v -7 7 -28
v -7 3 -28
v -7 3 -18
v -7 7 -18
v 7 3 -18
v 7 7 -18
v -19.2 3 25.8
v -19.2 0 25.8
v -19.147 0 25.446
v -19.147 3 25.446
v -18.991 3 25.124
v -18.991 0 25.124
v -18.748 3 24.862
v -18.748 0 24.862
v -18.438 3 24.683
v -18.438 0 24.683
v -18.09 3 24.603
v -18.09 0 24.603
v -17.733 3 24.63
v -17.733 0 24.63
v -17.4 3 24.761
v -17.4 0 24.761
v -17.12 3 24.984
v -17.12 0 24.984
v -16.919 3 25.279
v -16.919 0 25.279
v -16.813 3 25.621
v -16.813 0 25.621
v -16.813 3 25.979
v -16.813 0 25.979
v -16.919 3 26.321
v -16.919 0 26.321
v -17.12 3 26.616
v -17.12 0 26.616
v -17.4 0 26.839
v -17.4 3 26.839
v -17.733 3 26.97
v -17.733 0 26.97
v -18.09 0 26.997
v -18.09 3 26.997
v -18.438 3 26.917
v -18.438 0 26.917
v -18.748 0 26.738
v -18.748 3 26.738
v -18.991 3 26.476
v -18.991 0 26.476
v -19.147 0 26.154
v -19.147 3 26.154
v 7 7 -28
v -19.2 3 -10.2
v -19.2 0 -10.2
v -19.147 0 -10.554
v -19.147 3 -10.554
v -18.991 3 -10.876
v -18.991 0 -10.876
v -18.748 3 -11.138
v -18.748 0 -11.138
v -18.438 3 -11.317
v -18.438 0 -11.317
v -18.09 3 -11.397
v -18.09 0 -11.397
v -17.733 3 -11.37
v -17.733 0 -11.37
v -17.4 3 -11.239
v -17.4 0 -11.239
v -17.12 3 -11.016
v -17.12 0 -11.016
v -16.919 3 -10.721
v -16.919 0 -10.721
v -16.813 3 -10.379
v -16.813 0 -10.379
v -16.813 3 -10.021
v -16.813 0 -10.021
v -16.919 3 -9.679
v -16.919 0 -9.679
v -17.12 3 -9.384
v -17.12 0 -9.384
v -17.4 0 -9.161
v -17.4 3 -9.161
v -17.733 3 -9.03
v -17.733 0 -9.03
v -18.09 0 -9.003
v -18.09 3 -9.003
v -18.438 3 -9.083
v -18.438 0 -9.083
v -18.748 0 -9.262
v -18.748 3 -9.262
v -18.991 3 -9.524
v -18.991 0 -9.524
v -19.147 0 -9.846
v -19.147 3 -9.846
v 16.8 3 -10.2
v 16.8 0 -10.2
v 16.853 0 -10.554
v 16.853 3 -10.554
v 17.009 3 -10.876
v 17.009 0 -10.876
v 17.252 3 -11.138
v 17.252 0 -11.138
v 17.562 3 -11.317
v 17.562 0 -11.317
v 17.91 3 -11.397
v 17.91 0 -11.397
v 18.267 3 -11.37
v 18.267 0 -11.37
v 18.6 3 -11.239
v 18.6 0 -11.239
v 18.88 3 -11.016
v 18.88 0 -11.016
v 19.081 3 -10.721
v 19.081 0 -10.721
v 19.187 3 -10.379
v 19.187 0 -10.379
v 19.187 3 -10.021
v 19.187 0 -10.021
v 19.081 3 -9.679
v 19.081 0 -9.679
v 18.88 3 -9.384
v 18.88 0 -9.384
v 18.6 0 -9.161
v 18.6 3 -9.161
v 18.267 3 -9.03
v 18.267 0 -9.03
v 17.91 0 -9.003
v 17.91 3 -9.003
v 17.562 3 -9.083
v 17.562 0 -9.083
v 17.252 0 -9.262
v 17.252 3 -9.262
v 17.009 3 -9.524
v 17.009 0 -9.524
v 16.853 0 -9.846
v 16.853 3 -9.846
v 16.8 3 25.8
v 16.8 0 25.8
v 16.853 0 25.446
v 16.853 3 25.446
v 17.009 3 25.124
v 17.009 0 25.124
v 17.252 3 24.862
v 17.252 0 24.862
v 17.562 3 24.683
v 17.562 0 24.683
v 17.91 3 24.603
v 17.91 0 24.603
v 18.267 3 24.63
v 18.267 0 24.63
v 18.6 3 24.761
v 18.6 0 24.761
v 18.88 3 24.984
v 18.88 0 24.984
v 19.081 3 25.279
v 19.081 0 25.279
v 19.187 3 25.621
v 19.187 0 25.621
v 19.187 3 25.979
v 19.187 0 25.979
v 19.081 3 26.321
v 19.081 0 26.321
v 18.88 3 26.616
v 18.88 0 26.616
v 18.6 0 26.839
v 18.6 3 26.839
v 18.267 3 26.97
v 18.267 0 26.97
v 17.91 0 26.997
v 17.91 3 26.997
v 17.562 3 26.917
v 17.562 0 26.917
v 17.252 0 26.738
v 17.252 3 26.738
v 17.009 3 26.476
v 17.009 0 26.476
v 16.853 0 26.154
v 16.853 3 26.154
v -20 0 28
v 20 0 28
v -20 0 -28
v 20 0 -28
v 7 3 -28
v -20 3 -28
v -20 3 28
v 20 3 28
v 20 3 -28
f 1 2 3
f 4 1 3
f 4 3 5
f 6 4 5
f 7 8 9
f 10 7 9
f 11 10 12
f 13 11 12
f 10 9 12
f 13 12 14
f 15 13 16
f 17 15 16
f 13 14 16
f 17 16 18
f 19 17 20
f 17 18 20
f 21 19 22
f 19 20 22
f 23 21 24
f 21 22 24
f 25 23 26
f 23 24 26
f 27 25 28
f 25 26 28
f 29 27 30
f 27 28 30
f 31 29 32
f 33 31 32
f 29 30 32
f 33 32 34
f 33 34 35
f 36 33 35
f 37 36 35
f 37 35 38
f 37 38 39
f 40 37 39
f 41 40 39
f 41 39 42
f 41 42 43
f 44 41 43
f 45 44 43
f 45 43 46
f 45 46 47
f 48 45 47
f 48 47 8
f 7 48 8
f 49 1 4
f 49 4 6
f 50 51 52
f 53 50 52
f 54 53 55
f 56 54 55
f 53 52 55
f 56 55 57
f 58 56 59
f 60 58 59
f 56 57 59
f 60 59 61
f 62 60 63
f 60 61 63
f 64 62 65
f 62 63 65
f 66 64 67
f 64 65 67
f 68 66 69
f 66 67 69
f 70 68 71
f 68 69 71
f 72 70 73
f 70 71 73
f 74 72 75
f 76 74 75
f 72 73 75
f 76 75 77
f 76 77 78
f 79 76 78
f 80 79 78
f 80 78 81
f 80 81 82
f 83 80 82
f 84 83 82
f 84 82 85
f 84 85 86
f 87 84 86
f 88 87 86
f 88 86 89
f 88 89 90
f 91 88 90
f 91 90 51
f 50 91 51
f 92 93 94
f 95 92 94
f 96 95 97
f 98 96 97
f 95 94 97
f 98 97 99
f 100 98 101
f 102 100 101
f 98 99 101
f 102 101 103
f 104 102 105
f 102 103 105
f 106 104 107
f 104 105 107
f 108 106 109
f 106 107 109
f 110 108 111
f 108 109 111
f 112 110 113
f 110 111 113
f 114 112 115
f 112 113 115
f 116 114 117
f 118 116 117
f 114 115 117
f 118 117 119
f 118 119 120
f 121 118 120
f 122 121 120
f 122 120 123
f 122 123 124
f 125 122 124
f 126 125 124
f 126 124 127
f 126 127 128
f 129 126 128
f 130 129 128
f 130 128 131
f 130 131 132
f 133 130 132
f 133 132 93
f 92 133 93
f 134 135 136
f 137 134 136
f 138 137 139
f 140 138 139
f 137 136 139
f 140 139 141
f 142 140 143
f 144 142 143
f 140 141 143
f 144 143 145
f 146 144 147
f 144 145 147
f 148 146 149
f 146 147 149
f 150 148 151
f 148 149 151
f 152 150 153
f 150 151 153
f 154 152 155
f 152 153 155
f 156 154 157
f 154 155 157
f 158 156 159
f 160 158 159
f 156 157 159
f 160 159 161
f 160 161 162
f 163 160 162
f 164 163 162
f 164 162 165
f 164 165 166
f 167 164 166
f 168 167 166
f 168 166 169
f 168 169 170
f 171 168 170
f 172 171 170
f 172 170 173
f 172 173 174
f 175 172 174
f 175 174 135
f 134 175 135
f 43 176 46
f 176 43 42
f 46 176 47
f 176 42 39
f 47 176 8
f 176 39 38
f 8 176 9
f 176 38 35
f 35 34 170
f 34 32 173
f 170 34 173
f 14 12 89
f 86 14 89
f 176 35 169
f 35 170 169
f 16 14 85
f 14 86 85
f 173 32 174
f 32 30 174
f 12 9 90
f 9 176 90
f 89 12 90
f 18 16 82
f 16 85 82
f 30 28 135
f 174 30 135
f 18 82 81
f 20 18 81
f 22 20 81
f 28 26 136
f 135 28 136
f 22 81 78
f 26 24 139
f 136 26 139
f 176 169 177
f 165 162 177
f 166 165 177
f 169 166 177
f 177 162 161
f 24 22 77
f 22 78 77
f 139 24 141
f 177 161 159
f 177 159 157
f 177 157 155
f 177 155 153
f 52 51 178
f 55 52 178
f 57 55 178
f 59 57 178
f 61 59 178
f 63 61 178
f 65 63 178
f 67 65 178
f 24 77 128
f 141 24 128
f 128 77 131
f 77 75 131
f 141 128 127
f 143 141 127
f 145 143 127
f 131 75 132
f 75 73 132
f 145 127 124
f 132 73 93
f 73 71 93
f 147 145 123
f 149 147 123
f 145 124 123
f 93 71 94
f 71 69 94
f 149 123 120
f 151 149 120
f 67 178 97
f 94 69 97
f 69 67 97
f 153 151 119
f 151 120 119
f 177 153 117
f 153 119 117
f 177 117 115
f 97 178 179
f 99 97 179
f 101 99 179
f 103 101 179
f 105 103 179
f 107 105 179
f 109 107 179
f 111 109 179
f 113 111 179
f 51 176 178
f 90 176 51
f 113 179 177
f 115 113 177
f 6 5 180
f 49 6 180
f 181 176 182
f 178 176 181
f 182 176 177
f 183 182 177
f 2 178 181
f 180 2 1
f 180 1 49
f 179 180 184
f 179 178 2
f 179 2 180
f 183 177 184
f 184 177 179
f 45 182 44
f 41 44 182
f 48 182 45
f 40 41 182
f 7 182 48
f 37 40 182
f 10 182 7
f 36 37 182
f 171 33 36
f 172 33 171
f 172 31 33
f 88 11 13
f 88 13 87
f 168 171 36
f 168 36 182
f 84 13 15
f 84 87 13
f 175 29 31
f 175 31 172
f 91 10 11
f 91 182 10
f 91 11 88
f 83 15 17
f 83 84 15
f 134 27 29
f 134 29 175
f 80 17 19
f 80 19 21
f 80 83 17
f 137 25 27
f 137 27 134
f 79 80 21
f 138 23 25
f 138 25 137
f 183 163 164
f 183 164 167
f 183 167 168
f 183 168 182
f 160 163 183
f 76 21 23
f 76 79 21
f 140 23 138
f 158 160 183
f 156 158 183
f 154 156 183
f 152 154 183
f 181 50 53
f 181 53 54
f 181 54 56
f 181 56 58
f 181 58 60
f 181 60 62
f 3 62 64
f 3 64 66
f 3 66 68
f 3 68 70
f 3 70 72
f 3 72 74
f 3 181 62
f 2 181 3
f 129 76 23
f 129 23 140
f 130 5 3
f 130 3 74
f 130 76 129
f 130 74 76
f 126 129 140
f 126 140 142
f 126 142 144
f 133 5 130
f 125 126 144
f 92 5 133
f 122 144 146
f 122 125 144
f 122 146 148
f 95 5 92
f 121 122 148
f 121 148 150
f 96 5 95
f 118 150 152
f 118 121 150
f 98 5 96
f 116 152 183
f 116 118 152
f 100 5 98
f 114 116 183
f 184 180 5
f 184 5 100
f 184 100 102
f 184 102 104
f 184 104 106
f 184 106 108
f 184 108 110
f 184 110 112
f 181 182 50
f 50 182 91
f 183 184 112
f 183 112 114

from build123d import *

# Parameters (mm, degrees)
SKETCH_1_W      = 40
SKETCH_1_H      = 56
EXTRUDE_1_DEPTH = 3
HOLE_WIZARD_1_D = 2.4
EXTRUDE_2_DEPTH = 4


with BuildPart() as part:
    # 草图1 → 凸台-拉伸1 (new body)
    with BuildSketch(Plane(origin=(0, 0, 0), x_dir=(1, 0, 0), z_dir=(0, 1, 0))):
        Rectangle(SKETCH_1_W, SKETCH_1_H)
    extrude(amount=EXTRUDE_1_DEPTH)

    # 孔1 (through all)
    with Locations(Plane(origin=(0, 3, 0), x_dir=(1, 0, 0), z_dir=(0, 1, 0))):
        with Locations((-18, 10.2), (18, 10.2), (18, -25.8), (-18, -25.8)):
            Hole(HOLE_WIZARD_1_D / 2)

    # 草图5 → 凸台-拉伸2 (add)
    with BuildSketch(Plane(origin=(0, 3, 0), x_dir=(1, 0, 0), z_dir=(0, 1, 0))):
        Polygon((-7, 28), (-7, 18), (7, 18), (7, 28), (0, 28), align=None)
    extrude(amount=EXTRUDE_2_DEPTH)


solid = part.part
